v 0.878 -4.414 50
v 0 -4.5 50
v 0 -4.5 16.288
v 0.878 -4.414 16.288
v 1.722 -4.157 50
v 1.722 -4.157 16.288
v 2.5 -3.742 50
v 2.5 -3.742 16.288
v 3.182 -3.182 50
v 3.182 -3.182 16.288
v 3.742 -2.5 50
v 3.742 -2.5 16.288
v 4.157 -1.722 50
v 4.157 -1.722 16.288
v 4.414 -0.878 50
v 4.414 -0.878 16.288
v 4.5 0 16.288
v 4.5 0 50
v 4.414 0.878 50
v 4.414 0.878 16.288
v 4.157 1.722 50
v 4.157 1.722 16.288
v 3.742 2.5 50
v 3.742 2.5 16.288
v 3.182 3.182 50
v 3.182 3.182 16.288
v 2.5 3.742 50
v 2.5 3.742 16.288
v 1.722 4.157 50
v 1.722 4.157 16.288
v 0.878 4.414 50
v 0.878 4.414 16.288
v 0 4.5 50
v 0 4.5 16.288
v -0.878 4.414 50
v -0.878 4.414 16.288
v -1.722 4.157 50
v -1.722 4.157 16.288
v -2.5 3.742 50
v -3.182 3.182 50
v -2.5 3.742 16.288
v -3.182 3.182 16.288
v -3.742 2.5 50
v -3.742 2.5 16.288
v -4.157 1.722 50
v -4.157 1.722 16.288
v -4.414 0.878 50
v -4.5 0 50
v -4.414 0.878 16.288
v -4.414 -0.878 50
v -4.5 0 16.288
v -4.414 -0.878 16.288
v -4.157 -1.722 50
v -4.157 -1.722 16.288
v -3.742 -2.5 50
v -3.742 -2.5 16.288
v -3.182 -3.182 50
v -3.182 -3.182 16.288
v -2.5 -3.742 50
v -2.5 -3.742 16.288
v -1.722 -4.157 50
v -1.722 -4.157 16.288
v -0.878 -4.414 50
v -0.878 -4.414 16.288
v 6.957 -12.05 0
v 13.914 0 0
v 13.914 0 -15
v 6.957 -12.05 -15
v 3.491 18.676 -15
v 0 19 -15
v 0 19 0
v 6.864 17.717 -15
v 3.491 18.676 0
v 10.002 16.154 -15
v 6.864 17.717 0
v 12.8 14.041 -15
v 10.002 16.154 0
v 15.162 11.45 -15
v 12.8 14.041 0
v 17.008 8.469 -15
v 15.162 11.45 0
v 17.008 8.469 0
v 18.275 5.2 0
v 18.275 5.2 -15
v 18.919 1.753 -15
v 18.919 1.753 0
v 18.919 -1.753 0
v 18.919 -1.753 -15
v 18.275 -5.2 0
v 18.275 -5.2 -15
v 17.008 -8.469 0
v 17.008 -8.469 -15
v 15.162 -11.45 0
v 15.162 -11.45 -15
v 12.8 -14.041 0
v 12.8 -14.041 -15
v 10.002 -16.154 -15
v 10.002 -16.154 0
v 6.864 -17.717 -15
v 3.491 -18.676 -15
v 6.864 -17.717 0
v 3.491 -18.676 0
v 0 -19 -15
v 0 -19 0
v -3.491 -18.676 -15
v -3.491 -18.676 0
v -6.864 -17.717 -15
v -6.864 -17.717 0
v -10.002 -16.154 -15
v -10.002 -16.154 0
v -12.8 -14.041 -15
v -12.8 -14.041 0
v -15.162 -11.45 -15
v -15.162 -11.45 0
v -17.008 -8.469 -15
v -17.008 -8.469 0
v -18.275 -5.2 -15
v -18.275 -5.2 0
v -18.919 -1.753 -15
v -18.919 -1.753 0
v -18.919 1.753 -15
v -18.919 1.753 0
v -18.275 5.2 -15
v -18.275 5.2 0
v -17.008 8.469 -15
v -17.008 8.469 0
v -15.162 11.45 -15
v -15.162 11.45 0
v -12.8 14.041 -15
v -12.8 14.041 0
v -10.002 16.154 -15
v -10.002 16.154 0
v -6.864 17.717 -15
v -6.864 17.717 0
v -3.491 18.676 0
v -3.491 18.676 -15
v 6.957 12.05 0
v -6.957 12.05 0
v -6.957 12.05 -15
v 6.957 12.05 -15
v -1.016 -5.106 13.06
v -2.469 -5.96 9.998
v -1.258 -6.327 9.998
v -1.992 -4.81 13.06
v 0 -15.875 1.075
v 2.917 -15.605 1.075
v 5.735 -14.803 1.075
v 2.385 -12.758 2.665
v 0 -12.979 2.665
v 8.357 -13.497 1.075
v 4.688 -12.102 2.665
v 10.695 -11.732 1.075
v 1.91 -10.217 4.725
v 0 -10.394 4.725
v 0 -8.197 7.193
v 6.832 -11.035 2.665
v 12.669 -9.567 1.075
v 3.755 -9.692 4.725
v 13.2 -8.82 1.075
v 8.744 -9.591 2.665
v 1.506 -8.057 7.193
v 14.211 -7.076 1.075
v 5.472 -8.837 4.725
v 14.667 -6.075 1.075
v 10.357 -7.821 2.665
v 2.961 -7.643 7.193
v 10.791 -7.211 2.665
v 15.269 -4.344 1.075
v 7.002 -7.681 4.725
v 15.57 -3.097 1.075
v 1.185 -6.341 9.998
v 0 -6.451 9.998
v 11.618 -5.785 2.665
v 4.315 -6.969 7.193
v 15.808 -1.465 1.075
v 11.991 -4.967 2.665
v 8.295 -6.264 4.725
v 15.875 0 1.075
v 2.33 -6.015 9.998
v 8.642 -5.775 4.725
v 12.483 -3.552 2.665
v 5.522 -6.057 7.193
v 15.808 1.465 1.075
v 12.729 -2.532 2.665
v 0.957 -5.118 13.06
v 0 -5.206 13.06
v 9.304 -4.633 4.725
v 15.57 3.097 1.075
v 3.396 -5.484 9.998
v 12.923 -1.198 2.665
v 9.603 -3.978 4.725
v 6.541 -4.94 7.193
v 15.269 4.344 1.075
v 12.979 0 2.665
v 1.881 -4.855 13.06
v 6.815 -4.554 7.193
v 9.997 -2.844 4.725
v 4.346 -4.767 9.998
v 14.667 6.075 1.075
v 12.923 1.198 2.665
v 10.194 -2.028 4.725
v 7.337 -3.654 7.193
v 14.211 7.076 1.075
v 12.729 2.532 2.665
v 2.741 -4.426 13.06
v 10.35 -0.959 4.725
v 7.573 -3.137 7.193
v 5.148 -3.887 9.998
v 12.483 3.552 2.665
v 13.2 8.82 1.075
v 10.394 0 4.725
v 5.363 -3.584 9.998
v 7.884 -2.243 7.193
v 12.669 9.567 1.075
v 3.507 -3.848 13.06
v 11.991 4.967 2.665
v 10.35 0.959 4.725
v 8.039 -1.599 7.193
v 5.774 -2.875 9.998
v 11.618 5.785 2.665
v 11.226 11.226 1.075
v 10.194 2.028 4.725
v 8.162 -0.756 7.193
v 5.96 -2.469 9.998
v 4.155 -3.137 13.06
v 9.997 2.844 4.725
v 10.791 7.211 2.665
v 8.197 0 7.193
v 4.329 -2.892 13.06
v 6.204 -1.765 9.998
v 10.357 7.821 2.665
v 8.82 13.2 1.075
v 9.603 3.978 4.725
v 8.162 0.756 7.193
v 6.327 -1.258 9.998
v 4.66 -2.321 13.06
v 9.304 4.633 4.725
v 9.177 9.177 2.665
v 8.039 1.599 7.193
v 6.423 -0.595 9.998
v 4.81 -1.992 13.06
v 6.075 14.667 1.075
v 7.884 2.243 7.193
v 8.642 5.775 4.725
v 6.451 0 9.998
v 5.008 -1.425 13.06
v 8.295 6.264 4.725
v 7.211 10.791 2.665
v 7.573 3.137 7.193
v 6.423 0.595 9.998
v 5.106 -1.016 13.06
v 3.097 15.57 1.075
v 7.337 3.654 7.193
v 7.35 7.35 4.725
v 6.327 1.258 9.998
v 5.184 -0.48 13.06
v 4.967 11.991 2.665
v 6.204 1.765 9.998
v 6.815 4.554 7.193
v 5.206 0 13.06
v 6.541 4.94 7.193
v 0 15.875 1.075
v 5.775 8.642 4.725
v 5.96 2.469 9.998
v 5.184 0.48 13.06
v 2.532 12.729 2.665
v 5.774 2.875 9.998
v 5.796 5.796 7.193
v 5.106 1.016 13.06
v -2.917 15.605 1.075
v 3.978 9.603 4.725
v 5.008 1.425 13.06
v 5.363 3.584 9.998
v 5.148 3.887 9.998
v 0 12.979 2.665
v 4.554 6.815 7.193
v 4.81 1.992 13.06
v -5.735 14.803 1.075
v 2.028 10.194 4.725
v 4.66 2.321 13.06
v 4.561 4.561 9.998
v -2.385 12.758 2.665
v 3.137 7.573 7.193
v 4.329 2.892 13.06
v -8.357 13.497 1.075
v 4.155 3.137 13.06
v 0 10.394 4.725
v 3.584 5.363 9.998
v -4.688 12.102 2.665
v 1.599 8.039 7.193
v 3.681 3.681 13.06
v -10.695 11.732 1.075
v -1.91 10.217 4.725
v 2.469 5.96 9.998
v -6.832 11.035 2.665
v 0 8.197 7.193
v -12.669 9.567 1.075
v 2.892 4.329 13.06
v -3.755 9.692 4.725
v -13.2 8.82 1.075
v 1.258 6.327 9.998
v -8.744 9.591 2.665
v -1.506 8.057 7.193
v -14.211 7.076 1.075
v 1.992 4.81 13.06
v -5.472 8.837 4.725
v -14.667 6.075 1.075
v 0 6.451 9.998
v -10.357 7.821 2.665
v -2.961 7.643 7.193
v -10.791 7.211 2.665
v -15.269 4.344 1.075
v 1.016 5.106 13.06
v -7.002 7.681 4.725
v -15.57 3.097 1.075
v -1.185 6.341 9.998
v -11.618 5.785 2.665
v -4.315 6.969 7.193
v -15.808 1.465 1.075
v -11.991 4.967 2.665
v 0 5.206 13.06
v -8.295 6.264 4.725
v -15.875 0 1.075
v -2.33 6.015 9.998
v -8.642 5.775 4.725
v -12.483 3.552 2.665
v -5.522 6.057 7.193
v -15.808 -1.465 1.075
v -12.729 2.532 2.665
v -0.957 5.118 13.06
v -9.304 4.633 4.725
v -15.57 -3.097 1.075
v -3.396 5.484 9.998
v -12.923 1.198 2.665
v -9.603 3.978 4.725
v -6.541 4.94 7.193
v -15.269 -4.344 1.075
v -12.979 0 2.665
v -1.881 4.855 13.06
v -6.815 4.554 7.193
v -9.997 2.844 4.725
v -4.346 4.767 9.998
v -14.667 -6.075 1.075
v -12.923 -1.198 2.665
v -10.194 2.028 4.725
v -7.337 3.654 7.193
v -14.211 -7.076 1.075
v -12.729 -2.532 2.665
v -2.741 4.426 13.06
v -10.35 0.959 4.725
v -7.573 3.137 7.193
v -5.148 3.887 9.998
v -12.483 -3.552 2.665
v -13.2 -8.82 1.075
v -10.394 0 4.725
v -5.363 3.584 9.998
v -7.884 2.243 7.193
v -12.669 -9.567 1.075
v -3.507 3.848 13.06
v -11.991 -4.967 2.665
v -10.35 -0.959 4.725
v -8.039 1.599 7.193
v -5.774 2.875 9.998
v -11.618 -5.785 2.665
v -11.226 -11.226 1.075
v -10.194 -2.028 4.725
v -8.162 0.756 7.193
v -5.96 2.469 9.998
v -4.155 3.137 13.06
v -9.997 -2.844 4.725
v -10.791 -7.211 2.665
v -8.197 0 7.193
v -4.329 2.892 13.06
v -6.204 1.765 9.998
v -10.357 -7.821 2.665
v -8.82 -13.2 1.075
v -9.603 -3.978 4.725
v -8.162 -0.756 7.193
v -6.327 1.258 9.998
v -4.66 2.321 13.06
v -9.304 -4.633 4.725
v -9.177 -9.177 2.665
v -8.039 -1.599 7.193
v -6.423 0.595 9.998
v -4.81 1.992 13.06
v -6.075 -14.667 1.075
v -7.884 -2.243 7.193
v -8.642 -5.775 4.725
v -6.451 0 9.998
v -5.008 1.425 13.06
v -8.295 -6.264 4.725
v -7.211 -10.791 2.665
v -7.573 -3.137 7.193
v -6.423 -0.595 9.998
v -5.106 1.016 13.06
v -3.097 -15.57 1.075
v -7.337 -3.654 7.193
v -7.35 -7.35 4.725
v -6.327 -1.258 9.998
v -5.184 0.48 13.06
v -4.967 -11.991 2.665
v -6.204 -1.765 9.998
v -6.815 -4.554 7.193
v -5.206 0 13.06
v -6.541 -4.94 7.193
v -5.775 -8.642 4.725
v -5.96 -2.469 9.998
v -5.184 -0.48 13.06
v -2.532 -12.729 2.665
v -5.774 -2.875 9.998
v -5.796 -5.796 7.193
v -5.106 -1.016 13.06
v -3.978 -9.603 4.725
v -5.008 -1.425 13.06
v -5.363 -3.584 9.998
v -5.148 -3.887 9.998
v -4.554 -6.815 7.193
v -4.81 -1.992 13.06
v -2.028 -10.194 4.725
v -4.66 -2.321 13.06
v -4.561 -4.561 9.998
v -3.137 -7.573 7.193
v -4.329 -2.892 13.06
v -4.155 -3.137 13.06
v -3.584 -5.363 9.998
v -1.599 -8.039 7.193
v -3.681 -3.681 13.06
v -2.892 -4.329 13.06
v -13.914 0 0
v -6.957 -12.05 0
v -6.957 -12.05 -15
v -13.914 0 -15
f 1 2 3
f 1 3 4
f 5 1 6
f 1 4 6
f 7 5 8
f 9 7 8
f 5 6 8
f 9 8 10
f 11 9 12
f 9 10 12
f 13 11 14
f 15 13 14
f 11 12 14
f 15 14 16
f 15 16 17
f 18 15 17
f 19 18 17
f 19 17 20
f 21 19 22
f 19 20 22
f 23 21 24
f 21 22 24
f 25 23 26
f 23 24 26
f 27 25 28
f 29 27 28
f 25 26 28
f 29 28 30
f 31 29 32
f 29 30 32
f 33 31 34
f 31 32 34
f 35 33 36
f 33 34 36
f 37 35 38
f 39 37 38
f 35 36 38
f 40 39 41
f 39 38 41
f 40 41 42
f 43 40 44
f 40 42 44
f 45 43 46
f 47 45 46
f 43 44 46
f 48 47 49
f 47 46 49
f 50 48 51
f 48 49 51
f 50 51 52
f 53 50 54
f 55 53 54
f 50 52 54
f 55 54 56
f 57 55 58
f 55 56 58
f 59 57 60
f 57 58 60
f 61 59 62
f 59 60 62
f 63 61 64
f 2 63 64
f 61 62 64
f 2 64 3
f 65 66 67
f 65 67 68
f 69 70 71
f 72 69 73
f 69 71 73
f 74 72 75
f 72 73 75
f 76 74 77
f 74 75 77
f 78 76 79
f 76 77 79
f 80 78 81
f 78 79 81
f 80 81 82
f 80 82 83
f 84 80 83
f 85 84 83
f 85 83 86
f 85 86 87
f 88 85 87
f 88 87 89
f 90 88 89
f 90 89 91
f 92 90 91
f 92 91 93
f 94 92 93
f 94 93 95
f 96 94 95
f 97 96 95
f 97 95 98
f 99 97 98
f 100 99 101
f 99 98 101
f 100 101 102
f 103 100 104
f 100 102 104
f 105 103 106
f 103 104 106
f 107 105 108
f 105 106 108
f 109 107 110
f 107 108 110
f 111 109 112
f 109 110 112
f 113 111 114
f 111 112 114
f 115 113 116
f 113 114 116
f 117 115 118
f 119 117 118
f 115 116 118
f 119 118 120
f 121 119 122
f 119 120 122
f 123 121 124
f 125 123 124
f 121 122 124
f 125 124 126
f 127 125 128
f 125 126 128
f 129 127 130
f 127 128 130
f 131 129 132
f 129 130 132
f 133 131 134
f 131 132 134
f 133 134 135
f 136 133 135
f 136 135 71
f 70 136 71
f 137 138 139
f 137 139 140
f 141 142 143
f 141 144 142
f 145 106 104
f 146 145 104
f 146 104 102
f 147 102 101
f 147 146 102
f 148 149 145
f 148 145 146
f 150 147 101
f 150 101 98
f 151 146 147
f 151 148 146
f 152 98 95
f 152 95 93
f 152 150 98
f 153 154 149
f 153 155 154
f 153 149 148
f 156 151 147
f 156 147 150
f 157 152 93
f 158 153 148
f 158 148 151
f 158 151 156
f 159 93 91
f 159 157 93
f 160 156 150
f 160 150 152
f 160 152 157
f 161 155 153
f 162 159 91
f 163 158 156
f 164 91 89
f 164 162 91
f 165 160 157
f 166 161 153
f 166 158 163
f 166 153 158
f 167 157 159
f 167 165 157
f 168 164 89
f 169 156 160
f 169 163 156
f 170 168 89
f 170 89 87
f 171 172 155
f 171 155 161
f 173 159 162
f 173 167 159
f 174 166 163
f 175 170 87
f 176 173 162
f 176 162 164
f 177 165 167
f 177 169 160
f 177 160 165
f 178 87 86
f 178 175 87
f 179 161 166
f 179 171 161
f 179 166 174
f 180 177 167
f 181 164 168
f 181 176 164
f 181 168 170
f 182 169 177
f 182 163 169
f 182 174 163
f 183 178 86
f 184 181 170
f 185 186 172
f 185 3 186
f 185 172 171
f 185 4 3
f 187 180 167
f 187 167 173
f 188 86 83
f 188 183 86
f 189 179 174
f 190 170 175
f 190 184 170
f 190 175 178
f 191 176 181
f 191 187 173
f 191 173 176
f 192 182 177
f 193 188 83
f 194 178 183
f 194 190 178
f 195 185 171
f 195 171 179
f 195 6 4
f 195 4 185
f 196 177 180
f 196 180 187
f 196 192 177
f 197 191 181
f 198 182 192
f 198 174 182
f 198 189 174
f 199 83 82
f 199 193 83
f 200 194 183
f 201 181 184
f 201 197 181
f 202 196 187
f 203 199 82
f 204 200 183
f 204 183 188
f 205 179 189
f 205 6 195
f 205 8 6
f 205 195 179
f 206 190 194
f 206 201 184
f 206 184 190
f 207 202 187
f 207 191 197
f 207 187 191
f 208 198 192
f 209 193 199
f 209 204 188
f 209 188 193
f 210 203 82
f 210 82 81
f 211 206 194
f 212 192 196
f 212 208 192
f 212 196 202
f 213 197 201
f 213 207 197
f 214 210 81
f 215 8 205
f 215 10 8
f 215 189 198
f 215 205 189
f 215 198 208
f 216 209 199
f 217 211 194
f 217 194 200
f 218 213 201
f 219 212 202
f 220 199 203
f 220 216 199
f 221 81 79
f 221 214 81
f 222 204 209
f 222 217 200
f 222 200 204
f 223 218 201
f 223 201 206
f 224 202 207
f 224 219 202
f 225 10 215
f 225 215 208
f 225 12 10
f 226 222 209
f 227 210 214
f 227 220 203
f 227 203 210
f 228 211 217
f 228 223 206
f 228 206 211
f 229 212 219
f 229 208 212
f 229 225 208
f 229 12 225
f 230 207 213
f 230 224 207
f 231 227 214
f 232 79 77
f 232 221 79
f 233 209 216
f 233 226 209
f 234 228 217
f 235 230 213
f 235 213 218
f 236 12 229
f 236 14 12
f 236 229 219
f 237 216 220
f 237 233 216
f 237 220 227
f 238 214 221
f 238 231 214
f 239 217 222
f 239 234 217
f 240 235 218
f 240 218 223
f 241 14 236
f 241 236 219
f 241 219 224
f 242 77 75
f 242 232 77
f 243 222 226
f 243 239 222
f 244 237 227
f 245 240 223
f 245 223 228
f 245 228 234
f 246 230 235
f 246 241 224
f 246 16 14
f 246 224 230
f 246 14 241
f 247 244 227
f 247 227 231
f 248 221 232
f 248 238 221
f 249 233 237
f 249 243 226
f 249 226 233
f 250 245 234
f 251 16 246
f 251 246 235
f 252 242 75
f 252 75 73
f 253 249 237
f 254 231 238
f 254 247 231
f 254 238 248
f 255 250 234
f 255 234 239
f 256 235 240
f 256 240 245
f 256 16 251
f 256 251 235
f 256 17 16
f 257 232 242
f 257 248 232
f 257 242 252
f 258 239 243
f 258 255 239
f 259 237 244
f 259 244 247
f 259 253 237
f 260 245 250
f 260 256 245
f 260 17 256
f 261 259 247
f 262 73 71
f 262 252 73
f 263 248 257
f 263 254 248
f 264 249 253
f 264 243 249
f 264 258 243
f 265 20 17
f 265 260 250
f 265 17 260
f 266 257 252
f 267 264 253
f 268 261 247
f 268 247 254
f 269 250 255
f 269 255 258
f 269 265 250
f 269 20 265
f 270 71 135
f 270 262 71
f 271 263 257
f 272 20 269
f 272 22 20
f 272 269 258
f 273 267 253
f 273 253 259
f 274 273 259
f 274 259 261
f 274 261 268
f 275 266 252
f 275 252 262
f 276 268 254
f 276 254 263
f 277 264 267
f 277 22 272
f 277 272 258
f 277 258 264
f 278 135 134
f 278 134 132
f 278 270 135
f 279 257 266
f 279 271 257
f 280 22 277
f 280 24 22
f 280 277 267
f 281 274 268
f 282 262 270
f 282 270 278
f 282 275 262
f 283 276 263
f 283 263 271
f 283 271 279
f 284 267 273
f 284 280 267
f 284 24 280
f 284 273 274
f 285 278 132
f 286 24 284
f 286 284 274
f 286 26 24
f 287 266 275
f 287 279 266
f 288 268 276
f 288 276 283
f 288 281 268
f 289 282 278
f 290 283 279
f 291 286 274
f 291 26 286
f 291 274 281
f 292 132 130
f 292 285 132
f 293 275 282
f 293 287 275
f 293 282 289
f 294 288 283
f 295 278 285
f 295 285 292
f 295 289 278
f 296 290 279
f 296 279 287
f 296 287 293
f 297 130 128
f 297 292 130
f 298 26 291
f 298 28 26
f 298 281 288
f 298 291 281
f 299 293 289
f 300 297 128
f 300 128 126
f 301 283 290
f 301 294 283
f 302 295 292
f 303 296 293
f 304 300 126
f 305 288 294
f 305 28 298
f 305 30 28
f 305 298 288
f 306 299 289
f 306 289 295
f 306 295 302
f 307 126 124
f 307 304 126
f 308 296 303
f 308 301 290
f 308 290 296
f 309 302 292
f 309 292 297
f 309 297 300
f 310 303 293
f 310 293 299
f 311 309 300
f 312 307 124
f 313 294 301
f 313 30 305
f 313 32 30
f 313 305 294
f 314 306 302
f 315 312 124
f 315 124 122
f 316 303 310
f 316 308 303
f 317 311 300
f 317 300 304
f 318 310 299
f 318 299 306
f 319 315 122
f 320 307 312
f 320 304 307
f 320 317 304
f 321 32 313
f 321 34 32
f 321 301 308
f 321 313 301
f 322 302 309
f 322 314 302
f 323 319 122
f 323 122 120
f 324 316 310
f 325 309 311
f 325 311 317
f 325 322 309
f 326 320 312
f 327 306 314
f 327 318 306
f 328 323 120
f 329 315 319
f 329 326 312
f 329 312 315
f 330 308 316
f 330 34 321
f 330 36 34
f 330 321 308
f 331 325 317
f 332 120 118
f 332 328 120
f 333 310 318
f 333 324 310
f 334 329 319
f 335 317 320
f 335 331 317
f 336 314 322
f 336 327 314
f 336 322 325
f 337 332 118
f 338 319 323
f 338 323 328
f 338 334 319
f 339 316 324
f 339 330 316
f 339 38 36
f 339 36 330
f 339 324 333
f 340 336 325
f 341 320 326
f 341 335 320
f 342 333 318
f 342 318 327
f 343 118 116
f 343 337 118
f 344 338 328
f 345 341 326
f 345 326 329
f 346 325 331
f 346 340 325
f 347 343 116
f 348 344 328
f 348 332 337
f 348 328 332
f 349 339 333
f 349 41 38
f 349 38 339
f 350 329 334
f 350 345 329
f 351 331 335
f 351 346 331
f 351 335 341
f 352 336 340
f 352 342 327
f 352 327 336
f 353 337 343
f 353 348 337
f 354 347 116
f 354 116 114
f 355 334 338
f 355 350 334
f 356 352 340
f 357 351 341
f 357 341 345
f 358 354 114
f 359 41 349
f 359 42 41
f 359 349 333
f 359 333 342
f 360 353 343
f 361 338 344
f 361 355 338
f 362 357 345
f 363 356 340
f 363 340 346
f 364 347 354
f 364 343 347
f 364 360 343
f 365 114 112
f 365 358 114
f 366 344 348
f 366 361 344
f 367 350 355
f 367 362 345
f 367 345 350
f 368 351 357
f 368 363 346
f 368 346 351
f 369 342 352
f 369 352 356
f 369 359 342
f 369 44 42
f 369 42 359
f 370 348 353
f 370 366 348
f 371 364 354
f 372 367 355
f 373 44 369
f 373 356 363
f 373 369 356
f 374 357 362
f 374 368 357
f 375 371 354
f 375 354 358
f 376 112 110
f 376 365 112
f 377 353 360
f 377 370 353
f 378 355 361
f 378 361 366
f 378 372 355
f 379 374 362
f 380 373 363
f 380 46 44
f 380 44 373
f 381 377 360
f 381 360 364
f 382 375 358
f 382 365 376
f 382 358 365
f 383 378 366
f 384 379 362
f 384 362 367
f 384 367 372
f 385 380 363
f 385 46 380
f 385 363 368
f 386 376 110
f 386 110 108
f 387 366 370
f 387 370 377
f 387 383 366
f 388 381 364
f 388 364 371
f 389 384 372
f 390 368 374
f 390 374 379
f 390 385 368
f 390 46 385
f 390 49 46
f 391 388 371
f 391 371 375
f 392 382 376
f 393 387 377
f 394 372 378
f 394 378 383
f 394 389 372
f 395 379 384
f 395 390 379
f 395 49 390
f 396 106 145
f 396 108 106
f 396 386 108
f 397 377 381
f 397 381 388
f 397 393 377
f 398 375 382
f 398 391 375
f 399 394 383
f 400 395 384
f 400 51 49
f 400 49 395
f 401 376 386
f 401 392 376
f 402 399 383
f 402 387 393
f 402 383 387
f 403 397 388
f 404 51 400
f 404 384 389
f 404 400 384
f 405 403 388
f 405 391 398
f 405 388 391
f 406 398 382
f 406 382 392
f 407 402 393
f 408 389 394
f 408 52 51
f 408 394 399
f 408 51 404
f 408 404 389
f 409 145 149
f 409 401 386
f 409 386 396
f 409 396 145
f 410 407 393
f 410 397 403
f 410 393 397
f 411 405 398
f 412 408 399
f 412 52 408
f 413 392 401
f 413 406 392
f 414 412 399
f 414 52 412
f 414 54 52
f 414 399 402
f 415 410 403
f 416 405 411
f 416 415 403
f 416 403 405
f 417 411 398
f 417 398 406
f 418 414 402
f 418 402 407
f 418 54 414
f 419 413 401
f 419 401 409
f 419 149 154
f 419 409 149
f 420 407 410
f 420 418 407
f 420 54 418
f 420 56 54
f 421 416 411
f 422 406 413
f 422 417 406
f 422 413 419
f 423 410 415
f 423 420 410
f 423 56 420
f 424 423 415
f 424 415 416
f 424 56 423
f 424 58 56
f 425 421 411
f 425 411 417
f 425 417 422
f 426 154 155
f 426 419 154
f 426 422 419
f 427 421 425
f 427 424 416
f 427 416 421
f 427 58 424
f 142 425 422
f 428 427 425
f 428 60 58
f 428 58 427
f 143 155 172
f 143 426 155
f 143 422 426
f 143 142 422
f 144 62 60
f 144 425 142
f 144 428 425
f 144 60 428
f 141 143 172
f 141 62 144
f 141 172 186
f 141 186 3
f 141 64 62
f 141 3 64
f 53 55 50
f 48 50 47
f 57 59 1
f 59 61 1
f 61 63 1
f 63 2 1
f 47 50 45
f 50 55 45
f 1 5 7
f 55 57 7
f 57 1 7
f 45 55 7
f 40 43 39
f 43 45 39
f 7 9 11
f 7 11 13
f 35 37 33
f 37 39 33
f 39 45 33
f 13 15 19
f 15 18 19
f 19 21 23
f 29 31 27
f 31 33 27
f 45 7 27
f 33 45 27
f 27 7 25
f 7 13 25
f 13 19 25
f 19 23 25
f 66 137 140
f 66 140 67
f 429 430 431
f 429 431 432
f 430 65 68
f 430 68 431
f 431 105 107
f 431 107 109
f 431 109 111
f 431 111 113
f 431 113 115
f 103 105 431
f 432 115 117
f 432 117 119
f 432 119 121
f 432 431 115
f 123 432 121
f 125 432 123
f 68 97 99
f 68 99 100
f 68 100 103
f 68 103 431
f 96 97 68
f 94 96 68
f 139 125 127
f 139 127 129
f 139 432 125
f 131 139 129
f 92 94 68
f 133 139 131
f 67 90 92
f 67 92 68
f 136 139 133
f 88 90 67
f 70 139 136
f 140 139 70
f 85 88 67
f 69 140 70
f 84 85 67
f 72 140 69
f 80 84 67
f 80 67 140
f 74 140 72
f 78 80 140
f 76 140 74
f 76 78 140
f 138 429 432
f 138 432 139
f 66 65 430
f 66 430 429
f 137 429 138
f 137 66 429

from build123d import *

# Parameters (mm, degrees)
SKETCH001_R = 19
PAD_DEPTH   = 15


with BuildPart() as part:
    # Sketch → Revolution (revolve)
    with BuildSketch(Plane.YZ):
        with BuildLine():
            Line((0, 0), (0, 50))
            Line((0, 50), (-4.5, 50))
            Line((-4.5, 50), (-4.5, 16.287714))
            ThreePointArc((-19, 0), (-9.24271, 5.911764), (-4.5, 16.287714))
            Line((0, 0), (-19, 0))
        make_face()
    revolve(axis=Axis((0, 0, 0), (0, 0, 1)))

    # Sketch001 (on Face4 of Revolution) → Pad (new body)
    with BuildSketch(Plane.YX):
        Circle(SKETCH001_R)
        Polygon((0, 13.914141), (-12.05, 6.957071), (-12.05, -6.957071), (0, -13.914141), (12.05, -6.957071), (12.05, 6.957071), align=None, mode=Mode.SUBTRACT)
    extrude(amount=PAD_DEPTH)


solid = part.part
